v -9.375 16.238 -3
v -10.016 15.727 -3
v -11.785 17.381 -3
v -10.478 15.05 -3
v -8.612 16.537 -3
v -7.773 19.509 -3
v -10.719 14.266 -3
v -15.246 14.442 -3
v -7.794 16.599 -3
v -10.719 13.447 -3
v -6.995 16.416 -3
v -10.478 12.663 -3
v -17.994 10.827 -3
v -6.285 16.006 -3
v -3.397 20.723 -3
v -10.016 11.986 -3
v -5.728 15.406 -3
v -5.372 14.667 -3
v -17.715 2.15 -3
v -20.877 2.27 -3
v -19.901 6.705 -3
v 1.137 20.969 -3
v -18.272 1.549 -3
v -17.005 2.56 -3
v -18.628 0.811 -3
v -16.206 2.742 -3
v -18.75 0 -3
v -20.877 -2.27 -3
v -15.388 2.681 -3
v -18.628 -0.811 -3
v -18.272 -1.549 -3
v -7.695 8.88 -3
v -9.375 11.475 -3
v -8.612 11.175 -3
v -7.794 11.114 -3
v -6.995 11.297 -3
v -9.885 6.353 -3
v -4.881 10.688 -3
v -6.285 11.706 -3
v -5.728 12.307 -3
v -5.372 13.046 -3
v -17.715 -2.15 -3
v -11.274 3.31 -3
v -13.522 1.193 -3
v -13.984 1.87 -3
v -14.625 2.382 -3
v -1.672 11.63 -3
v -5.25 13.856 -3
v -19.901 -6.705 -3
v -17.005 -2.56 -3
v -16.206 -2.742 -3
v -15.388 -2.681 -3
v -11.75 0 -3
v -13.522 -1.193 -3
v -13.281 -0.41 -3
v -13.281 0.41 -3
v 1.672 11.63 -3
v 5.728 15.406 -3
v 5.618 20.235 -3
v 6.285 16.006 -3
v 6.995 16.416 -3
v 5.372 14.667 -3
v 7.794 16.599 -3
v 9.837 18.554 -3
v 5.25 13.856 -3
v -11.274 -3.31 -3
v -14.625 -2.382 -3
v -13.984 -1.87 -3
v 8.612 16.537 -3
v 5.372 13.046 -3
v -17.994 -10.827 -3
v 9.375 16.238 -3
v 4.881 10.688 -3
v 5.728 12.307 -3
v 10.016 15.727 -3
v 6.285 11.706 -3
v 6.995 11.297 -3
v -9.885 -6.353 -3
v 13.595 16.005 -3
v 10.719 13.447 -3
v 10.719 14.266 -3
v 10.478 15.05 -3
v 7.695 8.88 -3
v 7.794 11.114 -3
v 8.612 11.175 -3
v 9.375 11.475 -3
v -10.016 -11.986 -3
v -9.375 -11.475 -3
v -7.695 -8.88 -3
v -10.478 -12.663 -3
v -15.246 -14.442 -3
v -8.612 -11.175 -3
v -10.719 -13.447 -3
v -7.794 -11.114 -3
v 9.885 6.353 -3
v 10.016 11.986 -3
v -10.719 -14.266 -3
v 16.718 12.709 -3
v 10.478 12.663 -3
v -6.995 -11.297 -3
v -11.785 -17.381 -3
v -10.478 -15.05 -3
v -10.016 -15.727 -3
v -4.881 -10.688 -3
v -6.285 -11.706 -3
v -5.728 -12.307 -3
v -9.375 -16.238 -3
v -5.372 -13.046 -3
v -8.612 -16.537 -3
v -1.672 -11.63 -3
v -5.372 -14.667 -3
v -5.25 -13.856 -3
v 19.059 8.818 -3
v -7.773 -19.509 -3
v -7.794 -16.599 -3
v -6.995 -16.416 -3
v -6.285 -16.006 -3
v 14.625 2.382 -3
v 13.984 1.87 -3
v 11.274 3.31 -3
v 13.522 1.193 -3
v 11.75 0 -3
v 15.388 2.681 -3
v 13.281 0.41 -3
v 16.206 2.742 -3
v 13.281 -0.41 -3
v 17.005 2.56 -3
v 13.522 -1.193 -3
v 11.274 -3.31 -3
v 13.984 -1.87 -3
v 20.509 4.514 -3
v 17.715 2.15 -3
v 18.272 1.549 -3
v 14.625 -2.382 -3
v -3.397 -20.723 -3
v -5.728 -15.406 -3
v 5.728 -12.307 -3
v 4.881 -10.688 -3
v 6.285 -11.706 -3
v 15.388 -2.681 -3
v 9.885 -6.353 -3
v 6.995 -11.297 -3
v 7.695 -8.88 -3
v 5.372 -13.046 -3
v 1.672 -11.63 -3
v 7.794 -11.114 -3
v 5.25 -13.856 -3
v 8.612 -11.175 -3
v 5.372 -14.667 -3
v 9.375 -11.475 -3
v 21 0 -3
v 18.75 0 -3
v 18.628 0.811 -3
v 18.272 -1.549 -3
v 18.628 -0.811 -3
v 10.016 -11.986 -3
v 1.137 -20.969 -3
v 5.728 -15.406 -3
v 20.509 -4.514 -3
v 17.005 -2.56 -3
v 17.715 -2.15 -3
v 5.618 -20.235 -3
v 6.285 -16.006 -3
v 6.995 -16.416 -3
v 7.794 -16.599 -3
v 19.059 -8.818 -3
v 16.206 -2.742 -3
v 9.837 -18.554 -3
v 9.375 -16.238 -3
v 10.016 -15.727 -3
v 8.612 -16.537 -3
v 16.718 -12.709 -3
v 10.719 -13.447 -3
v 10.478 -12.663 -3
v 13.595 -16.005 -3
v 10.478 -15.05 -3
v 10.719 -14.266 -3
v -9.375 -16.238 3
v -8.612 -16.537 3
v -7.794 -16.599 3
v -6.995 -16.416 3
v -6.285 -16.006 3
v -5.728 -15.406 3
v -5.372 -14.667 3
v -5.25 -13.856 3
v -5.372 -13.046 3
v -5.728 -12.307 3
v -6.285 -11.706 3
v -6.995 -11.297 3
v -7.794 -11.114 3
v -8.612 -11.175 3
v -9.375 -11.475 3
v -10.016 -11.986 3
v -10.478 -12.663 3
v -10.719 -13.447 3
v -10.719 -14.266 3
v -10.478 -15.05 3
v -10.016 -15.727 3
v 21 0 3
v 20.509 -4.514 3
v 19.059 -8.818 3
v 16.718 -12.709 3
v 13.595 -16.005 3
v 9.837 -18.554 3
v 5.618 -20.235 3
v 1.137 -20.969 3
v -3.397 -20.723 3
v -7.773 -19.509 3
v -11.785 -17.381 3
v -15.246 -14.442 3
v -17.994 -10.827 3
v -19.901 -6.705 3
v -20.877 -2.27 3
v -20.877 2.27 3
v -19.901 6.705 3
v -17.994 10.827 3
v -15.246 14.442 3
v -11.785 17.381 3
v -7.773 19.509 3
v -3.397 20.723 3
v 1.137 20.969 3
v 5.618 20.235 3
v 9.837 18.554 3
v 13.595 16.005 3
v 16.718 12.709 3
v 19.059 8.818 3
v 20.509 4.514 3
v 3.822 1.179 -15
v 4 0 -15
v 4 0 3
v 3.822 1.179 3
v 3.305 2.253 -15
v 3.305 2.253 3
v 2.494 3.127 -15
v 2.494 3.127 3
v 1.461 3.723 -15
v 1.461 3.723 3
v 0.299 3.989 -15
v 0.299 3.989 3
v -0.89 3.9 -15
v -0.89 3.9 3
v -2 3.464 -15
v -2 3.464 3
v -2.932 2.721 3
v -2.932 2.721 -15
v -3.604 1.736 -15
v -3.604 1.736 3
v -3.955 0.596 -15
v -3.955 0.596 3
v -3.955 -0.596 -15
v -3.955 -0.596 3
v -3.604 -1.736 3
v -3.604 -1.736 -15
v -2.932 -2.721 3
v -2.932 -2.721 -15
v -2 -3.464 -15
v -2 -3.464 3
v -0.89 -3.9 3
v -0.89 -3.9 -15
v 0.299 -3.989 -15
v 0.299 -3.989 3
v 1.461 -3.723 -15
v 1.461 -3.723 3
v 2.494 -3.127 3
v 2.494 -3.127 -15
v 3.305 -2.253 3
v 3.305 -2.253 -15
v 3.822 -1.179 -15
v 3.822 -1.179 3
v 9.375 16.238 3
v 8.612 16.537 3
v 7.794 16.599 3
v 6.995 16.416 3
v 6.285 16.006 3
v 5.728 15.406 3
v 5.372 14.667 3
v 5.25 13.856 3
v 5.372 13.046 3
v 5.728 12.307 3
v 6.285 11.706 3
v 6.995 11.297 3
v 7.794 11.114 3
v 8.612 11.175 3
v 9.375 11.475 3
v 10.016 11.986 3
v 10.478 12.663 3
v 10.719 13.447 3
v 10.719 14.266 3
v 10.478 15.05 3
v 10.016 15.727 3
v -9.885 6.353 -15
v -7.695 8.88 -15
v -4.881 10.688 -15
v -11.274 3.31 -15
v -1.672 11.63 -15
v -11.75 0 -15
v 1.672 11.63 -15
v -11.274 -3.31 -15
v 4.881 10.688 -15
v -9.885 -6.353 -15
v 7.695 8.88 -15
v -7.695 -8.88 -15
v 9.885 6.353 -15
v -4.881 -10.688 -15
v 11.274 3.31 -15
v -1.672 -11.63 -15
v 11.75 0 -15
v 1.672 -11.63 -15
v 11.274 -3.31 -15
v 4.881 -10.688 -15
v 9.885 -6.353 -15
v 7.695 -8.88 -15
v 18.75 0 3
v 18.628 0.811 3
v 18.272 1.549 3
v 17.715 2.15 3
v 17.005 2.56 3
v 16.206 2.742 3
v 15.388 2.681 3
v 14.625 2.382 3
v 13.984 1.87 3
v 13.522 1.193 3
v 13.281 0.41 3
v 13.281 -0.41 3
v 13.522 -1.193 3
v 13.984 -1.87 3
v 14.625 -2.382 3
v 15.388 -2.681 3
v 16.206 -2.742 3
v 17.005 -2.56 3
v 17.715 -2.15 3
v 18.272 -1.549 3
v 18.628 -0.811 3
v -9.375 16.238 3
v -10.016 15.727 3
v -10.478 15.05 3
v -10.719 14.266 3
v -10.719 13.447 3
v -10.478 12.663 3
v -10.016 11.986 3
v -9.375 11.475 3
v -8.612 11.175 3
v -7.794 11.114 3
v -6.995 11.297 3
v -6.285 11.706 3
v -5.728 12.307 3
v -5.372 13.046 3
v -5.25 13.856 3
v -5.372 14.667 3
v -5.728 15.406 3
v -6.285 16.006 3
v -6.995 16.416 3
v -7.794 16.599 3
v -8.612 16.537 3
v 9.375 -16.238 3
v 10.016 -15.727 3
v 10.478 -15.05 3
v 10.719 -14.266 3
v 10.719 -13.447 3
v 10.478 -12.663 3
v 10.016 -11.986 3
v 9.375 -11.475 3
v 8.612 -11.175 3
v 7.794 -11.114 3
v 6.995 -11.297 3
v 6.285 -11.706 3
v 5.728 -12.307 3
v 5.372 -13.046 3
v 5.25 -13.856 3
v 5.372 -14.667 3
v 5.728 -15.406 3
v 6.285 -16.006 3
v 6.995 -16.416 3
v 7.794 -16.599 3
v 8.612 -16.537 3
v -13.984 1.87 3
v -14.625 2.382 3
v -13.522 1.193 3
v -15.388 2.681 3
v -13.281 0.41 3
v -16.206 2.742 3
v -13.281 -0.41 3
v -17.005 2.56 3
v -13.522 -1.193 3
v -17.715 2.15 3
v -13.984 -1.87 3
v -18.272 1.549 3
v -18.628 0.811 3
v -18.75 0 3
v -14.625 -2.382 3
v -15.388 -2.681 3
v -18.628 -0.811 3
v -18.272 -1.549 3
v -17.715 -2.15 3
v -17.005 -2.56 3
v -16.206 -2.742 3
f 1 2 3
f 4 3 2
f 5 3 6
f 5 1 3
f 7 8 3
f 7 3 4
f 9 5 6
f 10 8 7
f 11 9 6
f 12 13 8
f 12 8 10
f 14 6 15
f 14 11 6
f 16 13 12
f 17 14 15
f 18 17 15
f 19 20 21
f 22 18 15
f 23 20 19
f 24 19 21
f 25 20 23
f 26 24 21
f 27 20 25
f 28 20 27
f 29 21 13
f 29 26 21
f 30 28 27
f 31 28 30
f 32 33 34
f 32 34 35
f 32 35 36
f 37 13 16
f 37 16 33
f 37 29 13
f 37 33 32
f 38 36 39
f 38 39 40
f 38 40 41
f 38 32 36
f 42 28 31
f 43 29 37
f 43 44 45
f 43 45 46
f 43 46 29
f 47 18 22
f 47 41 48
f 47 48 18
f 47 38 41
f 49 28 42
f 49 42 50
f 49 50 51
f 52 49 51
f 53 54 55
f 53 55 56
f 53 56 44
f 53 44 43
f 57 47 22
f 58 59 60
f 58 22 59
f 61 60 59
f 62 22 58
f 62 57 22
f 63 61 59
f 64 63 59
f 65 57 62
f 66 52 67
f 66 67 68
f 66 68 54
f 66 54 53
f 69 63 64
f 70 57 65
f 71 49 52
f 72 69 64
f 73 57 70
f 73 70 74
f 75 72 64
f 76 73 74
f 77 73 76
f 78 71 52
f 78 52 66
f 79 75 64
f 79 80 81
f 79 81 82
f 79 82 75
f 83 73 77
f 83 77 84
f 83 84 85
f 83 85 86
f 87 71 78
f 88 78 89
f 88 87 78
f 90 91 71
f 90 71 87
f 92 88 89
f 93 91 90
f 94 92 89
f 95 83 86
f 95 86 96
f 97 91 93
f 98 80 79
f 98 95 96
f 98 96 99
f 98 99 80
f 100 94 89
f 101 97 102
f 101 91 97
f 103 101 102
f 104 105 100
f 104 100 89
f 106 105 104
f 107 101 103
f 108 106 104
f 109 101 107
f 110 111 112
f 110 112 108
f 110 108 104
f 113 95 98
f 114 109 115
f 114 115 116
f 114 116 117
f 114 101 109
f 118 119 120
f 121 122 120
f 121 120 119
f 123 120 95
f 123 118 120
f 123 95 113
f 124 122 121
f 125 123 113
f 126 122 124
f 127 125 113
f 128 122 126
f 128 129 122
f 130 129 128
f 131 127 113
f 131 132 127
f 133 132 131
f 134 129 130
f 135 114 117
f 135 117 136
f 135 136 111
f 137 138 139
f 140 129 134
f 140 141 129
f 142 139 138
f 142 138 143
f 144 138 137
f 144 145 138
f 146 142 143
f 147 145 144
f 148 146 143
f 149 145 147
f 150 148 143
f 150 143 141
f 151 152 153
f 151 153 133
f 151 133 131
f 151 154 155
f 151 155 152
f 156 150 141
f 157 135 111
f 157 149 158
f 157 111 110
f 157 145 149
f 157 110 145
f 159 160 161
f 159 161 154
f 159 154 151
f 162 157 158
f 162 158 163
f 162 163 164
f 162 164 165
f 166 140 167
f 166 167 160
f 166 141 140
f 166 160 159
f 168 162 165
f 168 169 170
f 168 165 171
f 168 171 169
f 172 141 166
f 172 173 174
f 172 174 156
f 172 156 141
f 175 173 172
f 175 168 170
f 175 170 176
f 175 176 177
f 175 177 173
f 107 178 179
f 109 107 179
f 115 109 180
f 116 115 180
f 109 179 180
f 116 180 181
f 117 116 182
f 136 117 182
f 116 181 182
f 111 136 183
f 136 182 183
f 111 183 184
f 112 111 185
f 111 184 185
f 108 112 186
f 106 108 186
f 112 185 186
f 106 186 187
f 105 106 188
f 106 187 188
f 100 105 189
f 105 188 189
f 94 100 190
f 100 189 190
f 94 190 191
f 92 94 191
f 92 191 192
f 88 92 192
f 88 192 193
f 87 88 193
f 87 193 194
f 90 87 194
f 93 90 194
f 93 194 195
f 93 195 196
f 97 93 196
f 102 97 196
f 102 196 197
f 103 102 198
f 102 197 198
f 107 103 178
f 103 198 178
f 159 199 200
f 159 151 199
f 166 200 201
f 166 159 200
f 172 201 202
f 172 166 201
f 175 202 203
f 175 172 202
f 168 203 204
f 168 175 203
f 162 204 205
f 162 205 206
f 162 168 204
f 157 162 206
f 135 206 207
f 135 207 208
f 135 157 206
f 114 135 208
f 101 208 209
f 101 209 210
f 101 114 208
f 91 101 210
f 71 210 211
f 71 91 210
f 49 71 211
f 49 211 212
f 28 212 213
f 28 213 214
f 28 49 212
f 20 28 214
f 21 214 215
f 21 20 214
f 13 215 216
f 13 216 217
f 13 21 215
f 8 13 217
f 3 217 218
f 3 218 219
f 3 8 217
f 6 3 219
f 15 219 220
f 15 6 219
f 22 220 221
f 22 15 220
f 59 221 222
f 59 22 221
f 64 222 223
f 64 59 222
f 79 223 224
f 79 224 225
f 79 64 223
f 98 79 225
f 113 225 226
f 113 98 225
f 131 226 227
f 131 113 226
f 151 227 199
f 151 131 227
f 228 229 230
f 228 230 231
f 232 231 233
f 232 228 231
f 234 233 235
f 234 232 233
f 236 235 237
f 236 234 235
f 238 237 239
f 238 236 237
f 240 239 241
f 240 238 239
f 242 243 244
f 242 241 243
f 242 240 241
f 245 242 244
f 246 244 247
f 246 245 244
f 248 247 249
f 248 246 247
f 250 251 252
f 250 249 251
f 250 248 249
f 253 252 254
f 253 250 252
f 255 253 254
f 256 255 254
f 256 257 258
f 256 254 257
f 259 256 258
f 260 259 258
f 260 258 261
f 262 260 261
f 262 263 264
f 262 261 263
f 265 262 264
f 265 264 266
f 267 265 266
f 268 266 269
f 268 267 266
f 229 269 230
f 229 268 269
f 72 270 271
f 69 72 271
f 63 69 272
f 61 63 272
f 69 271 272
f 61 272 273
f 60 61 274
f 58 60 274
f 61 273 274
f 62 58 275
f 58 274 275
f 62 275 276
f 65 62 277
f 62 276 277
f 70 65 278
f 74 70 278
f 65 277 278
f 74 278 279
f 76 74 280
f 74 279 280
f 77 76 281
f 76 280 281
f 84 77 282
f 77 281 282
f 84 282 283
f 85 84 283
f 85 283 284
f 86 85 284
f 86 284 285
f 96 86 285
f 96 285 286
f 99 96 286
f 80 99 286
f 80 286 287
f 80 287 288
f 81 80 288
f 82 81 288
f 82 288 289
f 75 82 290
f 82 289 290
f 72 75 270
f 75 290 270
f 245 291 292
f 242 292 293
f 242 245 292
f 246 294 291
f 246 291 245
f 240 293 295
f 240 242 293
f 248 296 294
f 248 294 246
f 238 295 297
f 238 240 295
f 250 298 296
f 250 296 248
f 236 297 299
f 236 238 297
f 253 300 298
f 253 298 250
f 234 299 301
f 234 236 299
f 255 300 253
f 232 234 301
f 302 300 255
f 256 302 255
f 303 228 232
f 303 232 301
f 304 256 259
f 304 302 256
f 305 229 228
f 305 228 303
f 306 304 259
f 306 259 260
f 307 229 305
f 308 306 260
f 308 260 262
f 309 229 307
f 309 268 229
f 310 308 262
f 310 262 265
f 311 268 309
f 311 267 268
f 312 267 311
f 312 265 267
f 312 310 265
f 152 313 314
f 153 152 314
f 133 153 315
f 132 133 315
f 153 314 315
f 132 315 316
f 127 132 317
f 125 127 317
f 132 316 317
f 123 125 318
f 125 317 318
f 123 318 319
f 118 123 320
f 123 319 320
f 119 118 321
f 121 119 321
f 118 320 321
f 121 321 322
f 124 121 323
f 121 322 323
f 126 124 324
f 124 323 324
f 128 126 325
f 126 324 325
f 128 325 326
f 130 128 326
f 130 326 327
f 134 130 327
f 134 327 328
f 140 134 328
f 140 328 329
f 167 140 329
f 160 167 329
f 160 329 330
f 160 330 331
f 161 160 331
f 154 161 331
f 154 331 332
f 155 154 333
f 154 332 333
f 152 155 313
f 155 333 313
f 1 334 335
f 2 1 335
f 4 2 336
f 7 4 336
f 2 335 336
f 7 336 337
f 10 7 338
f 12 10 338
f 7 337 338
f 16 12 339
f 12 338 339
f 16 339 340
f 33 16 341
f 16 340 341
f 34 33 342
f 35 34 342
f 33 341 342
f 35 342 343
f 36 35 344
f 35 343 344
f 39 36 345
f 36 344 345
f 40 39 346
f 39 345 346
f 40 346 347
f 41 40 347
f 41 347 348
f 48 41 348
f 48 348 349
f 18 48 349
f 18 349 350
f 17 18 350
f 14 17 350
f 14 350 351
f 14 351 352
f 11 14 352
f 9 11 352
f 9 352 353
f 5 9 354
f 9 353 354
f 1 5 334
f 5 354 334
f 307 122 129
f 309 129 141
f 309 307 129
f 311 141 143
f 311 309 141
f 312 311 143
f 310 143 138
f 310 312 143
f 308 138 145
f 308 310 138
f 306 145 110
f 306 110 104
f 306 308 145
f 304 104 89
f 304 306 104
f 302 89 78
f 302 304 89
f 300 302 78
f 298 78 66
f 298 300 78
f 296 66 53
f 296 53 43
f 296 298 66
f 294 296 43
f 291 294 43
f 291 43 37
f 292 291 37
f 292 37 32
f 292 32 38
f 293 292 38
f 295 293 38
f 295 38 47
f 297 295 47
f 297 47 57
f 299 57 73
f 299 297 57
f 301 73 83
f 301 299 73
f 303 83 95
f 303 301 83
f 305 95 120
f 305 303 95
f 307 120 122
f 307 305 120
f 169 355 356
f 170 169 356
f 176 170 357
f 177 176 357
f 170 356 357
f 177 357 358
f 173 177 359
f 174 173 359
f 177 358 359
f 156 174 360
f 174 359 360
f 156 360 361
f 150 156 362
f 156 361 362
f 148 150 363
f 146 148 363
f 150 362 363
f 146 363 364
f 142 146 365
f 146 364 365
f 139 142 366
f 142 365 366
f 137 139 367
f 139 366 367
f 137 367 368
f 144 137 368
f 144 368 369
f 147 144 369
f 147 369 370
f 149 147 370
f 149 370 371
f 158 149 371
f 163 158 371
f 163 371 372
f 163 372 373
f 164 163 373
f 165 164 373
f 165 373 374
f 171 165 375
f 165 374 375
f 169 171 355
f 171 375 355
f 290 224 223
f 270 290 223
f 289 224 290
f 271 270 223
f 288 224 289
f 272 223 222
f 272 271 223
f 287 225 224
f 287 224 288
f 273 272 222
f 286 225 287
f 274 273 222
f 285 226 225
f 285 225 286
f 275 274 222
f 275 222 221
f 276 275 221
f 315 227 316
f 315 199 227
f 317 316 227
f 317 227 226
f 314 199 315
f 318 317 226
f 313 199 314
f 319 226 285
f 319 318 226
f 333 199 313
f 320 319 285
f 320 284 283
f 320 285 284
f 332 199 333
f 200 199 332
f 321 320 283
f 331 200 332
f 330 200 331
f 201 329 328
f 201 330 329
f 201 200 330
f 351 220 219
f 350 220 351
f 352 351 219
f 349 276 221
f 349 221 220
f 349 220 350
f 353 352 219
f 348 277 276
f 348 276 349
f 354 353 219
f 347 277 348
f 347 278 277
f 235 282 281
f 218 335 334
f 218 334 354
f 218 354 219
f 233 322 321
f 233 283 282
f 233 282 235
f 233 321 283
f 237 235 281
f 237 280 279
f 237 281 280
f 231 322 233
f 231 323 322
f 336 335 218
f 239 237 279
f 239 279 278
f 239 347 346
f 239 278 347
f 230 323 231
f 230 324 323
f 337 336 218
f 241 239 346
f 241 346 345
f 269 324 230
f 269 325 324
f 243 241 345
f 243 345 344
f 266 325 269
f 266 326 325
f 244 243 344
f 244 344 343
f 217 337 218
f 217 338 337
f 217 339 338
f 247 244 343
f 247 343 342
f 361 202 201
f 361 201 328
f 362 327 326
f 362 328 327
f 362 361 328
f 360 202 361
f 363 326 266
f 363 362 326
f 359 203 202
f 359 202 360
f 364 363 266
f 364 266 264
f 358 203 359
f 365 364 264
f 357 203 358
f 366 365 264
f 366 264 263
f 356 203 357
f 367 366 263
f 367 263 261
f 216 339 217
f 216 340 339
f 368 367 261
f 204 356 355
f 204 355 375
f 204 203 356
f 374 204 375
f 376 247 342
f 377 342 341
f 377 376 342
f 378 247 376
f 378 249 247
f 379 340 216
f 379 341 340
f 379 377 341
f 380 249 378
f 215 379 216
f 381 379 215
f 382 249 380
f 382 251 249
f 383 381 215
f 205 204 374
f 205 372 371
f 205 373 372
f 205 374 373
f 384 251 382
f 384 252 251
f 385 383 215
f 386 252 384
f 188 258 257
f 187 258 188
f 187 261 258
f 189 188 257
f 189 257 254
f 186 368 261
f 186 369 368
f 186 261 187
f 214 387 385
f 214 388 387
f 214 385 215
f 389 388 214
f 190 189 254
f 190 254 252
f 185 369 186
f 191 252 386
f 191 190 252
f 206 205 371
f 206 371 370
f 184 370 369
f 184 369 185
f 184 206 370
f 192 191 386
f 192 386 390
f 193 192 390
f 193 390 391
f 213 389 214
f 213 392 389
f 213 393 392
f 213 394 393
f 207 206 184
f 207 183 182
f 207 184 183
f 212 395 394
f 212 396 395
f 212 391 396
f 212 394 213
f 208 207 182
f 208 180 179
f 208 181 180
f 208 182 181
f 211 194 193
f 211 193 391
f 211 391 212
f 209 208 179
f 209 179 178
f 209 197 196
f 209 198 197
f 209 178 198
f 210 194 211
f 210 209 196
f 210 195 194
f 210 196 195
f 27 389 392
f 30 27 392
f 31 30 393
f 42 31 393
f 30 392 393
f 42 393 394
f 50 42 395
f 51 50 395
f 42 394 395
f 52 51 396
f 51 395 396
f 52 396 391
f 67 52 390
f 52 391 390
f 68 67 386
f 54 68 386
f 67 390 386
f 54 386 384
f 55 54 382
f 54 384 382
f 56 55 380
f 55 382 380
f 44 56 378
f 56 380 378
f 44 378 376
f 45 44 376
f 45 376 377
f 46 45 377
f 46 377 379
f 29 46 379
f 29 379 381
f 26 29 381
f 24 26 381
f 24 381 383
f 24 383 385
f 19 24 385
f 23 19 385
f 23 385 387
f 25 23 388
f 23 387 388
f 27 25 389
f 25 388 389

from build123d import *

# Parameters (mm, degrees)
CUT_EXTRUDE_5_DEPTH      = 34.271609519
CUT_EXTRUDE_5_DEPTH_BACK = 34.271609519
SKETCH_8_R               = 4
EXTRUDE_START            = -75
SKETCH_10_R              = 4
EXTRUDE_1_DEPTH          = 150
SKETCH_12_R              = 2.75
CUT_EXTRUDE_6_DEPTH      = 6
PATTERN_CIRCULAR_1_COUNT = 6


with BuildPart() as part:
    # 草图3 → 旋转1 (revolve)
    with BuildSketch(Plane(origin=(0, 0, 0), x_dir=(0, 0, -1), z_dir=(1, 0, 0)), mode=Mode.PRIVATE) as revolve_1_sk:
        Polygon((-3, 0), (-3, 21), (3, 21), (3, 11.75), (15, 11.75), (15, 0), align=None)
    revolve(revolve_1_sk.sketch.rotate(Axis((0, 0, 3), (0, 0, -1)), 90), axis=Axis((0, 0, 3), (0, 0, -1)))

    # 草图8 → 切除-拉伸5 (cut, two sides: drawn at the far end of the back side and taken through both)
    with BuildSketch(Plane.XY.offset(-CUT_EXTRUDE_5_DEPTH_BACK)):
        Circle(SKETCH_8_R)
    extrude(amount=CUT_EXTRUDE_5_DEPTH + CUT_EXTRUDE_5_DEPTH_BACK, mode=Mode.SUBTRACT)

    # 草图12 → 切除-拉伸6 (cut)
    with BuildSketch(Plane.XY.offset(3)):
        with Locations((16, 0)):
            Circle(SKETCH_12_R)
    cut_extrude_6 = extrude(amount=-CUT_EXTRUDE_6_DEPTH, mode=Mode.SUBTRACT)

    # 阵列(圆周)1: 切除-拉伸6 ×6 about axis
    pattern_circular_1_axis = Axis((0, 0, 0), (0, 0, 1))
    for i in range(1, PATTERN_CIRCULAR_1_COUNT):
        add(cut_extrude_6.rotate(pattern_circular_1_axis, i * 360 / PATTERN_CIRCULAR_1_COUNT), mode=Mode.SUBTRACT)


with BuildPart() as body_2:
    # 草图10 → 凸台-拉伸1 (new body)
    with BuildSketch(Plane.XY.offset(EXTRUDE_START)):
        Circle(SKETCH_10_R)
    extrude(amount=EXTRUDE_1_DEPTH)


solid = part.part
